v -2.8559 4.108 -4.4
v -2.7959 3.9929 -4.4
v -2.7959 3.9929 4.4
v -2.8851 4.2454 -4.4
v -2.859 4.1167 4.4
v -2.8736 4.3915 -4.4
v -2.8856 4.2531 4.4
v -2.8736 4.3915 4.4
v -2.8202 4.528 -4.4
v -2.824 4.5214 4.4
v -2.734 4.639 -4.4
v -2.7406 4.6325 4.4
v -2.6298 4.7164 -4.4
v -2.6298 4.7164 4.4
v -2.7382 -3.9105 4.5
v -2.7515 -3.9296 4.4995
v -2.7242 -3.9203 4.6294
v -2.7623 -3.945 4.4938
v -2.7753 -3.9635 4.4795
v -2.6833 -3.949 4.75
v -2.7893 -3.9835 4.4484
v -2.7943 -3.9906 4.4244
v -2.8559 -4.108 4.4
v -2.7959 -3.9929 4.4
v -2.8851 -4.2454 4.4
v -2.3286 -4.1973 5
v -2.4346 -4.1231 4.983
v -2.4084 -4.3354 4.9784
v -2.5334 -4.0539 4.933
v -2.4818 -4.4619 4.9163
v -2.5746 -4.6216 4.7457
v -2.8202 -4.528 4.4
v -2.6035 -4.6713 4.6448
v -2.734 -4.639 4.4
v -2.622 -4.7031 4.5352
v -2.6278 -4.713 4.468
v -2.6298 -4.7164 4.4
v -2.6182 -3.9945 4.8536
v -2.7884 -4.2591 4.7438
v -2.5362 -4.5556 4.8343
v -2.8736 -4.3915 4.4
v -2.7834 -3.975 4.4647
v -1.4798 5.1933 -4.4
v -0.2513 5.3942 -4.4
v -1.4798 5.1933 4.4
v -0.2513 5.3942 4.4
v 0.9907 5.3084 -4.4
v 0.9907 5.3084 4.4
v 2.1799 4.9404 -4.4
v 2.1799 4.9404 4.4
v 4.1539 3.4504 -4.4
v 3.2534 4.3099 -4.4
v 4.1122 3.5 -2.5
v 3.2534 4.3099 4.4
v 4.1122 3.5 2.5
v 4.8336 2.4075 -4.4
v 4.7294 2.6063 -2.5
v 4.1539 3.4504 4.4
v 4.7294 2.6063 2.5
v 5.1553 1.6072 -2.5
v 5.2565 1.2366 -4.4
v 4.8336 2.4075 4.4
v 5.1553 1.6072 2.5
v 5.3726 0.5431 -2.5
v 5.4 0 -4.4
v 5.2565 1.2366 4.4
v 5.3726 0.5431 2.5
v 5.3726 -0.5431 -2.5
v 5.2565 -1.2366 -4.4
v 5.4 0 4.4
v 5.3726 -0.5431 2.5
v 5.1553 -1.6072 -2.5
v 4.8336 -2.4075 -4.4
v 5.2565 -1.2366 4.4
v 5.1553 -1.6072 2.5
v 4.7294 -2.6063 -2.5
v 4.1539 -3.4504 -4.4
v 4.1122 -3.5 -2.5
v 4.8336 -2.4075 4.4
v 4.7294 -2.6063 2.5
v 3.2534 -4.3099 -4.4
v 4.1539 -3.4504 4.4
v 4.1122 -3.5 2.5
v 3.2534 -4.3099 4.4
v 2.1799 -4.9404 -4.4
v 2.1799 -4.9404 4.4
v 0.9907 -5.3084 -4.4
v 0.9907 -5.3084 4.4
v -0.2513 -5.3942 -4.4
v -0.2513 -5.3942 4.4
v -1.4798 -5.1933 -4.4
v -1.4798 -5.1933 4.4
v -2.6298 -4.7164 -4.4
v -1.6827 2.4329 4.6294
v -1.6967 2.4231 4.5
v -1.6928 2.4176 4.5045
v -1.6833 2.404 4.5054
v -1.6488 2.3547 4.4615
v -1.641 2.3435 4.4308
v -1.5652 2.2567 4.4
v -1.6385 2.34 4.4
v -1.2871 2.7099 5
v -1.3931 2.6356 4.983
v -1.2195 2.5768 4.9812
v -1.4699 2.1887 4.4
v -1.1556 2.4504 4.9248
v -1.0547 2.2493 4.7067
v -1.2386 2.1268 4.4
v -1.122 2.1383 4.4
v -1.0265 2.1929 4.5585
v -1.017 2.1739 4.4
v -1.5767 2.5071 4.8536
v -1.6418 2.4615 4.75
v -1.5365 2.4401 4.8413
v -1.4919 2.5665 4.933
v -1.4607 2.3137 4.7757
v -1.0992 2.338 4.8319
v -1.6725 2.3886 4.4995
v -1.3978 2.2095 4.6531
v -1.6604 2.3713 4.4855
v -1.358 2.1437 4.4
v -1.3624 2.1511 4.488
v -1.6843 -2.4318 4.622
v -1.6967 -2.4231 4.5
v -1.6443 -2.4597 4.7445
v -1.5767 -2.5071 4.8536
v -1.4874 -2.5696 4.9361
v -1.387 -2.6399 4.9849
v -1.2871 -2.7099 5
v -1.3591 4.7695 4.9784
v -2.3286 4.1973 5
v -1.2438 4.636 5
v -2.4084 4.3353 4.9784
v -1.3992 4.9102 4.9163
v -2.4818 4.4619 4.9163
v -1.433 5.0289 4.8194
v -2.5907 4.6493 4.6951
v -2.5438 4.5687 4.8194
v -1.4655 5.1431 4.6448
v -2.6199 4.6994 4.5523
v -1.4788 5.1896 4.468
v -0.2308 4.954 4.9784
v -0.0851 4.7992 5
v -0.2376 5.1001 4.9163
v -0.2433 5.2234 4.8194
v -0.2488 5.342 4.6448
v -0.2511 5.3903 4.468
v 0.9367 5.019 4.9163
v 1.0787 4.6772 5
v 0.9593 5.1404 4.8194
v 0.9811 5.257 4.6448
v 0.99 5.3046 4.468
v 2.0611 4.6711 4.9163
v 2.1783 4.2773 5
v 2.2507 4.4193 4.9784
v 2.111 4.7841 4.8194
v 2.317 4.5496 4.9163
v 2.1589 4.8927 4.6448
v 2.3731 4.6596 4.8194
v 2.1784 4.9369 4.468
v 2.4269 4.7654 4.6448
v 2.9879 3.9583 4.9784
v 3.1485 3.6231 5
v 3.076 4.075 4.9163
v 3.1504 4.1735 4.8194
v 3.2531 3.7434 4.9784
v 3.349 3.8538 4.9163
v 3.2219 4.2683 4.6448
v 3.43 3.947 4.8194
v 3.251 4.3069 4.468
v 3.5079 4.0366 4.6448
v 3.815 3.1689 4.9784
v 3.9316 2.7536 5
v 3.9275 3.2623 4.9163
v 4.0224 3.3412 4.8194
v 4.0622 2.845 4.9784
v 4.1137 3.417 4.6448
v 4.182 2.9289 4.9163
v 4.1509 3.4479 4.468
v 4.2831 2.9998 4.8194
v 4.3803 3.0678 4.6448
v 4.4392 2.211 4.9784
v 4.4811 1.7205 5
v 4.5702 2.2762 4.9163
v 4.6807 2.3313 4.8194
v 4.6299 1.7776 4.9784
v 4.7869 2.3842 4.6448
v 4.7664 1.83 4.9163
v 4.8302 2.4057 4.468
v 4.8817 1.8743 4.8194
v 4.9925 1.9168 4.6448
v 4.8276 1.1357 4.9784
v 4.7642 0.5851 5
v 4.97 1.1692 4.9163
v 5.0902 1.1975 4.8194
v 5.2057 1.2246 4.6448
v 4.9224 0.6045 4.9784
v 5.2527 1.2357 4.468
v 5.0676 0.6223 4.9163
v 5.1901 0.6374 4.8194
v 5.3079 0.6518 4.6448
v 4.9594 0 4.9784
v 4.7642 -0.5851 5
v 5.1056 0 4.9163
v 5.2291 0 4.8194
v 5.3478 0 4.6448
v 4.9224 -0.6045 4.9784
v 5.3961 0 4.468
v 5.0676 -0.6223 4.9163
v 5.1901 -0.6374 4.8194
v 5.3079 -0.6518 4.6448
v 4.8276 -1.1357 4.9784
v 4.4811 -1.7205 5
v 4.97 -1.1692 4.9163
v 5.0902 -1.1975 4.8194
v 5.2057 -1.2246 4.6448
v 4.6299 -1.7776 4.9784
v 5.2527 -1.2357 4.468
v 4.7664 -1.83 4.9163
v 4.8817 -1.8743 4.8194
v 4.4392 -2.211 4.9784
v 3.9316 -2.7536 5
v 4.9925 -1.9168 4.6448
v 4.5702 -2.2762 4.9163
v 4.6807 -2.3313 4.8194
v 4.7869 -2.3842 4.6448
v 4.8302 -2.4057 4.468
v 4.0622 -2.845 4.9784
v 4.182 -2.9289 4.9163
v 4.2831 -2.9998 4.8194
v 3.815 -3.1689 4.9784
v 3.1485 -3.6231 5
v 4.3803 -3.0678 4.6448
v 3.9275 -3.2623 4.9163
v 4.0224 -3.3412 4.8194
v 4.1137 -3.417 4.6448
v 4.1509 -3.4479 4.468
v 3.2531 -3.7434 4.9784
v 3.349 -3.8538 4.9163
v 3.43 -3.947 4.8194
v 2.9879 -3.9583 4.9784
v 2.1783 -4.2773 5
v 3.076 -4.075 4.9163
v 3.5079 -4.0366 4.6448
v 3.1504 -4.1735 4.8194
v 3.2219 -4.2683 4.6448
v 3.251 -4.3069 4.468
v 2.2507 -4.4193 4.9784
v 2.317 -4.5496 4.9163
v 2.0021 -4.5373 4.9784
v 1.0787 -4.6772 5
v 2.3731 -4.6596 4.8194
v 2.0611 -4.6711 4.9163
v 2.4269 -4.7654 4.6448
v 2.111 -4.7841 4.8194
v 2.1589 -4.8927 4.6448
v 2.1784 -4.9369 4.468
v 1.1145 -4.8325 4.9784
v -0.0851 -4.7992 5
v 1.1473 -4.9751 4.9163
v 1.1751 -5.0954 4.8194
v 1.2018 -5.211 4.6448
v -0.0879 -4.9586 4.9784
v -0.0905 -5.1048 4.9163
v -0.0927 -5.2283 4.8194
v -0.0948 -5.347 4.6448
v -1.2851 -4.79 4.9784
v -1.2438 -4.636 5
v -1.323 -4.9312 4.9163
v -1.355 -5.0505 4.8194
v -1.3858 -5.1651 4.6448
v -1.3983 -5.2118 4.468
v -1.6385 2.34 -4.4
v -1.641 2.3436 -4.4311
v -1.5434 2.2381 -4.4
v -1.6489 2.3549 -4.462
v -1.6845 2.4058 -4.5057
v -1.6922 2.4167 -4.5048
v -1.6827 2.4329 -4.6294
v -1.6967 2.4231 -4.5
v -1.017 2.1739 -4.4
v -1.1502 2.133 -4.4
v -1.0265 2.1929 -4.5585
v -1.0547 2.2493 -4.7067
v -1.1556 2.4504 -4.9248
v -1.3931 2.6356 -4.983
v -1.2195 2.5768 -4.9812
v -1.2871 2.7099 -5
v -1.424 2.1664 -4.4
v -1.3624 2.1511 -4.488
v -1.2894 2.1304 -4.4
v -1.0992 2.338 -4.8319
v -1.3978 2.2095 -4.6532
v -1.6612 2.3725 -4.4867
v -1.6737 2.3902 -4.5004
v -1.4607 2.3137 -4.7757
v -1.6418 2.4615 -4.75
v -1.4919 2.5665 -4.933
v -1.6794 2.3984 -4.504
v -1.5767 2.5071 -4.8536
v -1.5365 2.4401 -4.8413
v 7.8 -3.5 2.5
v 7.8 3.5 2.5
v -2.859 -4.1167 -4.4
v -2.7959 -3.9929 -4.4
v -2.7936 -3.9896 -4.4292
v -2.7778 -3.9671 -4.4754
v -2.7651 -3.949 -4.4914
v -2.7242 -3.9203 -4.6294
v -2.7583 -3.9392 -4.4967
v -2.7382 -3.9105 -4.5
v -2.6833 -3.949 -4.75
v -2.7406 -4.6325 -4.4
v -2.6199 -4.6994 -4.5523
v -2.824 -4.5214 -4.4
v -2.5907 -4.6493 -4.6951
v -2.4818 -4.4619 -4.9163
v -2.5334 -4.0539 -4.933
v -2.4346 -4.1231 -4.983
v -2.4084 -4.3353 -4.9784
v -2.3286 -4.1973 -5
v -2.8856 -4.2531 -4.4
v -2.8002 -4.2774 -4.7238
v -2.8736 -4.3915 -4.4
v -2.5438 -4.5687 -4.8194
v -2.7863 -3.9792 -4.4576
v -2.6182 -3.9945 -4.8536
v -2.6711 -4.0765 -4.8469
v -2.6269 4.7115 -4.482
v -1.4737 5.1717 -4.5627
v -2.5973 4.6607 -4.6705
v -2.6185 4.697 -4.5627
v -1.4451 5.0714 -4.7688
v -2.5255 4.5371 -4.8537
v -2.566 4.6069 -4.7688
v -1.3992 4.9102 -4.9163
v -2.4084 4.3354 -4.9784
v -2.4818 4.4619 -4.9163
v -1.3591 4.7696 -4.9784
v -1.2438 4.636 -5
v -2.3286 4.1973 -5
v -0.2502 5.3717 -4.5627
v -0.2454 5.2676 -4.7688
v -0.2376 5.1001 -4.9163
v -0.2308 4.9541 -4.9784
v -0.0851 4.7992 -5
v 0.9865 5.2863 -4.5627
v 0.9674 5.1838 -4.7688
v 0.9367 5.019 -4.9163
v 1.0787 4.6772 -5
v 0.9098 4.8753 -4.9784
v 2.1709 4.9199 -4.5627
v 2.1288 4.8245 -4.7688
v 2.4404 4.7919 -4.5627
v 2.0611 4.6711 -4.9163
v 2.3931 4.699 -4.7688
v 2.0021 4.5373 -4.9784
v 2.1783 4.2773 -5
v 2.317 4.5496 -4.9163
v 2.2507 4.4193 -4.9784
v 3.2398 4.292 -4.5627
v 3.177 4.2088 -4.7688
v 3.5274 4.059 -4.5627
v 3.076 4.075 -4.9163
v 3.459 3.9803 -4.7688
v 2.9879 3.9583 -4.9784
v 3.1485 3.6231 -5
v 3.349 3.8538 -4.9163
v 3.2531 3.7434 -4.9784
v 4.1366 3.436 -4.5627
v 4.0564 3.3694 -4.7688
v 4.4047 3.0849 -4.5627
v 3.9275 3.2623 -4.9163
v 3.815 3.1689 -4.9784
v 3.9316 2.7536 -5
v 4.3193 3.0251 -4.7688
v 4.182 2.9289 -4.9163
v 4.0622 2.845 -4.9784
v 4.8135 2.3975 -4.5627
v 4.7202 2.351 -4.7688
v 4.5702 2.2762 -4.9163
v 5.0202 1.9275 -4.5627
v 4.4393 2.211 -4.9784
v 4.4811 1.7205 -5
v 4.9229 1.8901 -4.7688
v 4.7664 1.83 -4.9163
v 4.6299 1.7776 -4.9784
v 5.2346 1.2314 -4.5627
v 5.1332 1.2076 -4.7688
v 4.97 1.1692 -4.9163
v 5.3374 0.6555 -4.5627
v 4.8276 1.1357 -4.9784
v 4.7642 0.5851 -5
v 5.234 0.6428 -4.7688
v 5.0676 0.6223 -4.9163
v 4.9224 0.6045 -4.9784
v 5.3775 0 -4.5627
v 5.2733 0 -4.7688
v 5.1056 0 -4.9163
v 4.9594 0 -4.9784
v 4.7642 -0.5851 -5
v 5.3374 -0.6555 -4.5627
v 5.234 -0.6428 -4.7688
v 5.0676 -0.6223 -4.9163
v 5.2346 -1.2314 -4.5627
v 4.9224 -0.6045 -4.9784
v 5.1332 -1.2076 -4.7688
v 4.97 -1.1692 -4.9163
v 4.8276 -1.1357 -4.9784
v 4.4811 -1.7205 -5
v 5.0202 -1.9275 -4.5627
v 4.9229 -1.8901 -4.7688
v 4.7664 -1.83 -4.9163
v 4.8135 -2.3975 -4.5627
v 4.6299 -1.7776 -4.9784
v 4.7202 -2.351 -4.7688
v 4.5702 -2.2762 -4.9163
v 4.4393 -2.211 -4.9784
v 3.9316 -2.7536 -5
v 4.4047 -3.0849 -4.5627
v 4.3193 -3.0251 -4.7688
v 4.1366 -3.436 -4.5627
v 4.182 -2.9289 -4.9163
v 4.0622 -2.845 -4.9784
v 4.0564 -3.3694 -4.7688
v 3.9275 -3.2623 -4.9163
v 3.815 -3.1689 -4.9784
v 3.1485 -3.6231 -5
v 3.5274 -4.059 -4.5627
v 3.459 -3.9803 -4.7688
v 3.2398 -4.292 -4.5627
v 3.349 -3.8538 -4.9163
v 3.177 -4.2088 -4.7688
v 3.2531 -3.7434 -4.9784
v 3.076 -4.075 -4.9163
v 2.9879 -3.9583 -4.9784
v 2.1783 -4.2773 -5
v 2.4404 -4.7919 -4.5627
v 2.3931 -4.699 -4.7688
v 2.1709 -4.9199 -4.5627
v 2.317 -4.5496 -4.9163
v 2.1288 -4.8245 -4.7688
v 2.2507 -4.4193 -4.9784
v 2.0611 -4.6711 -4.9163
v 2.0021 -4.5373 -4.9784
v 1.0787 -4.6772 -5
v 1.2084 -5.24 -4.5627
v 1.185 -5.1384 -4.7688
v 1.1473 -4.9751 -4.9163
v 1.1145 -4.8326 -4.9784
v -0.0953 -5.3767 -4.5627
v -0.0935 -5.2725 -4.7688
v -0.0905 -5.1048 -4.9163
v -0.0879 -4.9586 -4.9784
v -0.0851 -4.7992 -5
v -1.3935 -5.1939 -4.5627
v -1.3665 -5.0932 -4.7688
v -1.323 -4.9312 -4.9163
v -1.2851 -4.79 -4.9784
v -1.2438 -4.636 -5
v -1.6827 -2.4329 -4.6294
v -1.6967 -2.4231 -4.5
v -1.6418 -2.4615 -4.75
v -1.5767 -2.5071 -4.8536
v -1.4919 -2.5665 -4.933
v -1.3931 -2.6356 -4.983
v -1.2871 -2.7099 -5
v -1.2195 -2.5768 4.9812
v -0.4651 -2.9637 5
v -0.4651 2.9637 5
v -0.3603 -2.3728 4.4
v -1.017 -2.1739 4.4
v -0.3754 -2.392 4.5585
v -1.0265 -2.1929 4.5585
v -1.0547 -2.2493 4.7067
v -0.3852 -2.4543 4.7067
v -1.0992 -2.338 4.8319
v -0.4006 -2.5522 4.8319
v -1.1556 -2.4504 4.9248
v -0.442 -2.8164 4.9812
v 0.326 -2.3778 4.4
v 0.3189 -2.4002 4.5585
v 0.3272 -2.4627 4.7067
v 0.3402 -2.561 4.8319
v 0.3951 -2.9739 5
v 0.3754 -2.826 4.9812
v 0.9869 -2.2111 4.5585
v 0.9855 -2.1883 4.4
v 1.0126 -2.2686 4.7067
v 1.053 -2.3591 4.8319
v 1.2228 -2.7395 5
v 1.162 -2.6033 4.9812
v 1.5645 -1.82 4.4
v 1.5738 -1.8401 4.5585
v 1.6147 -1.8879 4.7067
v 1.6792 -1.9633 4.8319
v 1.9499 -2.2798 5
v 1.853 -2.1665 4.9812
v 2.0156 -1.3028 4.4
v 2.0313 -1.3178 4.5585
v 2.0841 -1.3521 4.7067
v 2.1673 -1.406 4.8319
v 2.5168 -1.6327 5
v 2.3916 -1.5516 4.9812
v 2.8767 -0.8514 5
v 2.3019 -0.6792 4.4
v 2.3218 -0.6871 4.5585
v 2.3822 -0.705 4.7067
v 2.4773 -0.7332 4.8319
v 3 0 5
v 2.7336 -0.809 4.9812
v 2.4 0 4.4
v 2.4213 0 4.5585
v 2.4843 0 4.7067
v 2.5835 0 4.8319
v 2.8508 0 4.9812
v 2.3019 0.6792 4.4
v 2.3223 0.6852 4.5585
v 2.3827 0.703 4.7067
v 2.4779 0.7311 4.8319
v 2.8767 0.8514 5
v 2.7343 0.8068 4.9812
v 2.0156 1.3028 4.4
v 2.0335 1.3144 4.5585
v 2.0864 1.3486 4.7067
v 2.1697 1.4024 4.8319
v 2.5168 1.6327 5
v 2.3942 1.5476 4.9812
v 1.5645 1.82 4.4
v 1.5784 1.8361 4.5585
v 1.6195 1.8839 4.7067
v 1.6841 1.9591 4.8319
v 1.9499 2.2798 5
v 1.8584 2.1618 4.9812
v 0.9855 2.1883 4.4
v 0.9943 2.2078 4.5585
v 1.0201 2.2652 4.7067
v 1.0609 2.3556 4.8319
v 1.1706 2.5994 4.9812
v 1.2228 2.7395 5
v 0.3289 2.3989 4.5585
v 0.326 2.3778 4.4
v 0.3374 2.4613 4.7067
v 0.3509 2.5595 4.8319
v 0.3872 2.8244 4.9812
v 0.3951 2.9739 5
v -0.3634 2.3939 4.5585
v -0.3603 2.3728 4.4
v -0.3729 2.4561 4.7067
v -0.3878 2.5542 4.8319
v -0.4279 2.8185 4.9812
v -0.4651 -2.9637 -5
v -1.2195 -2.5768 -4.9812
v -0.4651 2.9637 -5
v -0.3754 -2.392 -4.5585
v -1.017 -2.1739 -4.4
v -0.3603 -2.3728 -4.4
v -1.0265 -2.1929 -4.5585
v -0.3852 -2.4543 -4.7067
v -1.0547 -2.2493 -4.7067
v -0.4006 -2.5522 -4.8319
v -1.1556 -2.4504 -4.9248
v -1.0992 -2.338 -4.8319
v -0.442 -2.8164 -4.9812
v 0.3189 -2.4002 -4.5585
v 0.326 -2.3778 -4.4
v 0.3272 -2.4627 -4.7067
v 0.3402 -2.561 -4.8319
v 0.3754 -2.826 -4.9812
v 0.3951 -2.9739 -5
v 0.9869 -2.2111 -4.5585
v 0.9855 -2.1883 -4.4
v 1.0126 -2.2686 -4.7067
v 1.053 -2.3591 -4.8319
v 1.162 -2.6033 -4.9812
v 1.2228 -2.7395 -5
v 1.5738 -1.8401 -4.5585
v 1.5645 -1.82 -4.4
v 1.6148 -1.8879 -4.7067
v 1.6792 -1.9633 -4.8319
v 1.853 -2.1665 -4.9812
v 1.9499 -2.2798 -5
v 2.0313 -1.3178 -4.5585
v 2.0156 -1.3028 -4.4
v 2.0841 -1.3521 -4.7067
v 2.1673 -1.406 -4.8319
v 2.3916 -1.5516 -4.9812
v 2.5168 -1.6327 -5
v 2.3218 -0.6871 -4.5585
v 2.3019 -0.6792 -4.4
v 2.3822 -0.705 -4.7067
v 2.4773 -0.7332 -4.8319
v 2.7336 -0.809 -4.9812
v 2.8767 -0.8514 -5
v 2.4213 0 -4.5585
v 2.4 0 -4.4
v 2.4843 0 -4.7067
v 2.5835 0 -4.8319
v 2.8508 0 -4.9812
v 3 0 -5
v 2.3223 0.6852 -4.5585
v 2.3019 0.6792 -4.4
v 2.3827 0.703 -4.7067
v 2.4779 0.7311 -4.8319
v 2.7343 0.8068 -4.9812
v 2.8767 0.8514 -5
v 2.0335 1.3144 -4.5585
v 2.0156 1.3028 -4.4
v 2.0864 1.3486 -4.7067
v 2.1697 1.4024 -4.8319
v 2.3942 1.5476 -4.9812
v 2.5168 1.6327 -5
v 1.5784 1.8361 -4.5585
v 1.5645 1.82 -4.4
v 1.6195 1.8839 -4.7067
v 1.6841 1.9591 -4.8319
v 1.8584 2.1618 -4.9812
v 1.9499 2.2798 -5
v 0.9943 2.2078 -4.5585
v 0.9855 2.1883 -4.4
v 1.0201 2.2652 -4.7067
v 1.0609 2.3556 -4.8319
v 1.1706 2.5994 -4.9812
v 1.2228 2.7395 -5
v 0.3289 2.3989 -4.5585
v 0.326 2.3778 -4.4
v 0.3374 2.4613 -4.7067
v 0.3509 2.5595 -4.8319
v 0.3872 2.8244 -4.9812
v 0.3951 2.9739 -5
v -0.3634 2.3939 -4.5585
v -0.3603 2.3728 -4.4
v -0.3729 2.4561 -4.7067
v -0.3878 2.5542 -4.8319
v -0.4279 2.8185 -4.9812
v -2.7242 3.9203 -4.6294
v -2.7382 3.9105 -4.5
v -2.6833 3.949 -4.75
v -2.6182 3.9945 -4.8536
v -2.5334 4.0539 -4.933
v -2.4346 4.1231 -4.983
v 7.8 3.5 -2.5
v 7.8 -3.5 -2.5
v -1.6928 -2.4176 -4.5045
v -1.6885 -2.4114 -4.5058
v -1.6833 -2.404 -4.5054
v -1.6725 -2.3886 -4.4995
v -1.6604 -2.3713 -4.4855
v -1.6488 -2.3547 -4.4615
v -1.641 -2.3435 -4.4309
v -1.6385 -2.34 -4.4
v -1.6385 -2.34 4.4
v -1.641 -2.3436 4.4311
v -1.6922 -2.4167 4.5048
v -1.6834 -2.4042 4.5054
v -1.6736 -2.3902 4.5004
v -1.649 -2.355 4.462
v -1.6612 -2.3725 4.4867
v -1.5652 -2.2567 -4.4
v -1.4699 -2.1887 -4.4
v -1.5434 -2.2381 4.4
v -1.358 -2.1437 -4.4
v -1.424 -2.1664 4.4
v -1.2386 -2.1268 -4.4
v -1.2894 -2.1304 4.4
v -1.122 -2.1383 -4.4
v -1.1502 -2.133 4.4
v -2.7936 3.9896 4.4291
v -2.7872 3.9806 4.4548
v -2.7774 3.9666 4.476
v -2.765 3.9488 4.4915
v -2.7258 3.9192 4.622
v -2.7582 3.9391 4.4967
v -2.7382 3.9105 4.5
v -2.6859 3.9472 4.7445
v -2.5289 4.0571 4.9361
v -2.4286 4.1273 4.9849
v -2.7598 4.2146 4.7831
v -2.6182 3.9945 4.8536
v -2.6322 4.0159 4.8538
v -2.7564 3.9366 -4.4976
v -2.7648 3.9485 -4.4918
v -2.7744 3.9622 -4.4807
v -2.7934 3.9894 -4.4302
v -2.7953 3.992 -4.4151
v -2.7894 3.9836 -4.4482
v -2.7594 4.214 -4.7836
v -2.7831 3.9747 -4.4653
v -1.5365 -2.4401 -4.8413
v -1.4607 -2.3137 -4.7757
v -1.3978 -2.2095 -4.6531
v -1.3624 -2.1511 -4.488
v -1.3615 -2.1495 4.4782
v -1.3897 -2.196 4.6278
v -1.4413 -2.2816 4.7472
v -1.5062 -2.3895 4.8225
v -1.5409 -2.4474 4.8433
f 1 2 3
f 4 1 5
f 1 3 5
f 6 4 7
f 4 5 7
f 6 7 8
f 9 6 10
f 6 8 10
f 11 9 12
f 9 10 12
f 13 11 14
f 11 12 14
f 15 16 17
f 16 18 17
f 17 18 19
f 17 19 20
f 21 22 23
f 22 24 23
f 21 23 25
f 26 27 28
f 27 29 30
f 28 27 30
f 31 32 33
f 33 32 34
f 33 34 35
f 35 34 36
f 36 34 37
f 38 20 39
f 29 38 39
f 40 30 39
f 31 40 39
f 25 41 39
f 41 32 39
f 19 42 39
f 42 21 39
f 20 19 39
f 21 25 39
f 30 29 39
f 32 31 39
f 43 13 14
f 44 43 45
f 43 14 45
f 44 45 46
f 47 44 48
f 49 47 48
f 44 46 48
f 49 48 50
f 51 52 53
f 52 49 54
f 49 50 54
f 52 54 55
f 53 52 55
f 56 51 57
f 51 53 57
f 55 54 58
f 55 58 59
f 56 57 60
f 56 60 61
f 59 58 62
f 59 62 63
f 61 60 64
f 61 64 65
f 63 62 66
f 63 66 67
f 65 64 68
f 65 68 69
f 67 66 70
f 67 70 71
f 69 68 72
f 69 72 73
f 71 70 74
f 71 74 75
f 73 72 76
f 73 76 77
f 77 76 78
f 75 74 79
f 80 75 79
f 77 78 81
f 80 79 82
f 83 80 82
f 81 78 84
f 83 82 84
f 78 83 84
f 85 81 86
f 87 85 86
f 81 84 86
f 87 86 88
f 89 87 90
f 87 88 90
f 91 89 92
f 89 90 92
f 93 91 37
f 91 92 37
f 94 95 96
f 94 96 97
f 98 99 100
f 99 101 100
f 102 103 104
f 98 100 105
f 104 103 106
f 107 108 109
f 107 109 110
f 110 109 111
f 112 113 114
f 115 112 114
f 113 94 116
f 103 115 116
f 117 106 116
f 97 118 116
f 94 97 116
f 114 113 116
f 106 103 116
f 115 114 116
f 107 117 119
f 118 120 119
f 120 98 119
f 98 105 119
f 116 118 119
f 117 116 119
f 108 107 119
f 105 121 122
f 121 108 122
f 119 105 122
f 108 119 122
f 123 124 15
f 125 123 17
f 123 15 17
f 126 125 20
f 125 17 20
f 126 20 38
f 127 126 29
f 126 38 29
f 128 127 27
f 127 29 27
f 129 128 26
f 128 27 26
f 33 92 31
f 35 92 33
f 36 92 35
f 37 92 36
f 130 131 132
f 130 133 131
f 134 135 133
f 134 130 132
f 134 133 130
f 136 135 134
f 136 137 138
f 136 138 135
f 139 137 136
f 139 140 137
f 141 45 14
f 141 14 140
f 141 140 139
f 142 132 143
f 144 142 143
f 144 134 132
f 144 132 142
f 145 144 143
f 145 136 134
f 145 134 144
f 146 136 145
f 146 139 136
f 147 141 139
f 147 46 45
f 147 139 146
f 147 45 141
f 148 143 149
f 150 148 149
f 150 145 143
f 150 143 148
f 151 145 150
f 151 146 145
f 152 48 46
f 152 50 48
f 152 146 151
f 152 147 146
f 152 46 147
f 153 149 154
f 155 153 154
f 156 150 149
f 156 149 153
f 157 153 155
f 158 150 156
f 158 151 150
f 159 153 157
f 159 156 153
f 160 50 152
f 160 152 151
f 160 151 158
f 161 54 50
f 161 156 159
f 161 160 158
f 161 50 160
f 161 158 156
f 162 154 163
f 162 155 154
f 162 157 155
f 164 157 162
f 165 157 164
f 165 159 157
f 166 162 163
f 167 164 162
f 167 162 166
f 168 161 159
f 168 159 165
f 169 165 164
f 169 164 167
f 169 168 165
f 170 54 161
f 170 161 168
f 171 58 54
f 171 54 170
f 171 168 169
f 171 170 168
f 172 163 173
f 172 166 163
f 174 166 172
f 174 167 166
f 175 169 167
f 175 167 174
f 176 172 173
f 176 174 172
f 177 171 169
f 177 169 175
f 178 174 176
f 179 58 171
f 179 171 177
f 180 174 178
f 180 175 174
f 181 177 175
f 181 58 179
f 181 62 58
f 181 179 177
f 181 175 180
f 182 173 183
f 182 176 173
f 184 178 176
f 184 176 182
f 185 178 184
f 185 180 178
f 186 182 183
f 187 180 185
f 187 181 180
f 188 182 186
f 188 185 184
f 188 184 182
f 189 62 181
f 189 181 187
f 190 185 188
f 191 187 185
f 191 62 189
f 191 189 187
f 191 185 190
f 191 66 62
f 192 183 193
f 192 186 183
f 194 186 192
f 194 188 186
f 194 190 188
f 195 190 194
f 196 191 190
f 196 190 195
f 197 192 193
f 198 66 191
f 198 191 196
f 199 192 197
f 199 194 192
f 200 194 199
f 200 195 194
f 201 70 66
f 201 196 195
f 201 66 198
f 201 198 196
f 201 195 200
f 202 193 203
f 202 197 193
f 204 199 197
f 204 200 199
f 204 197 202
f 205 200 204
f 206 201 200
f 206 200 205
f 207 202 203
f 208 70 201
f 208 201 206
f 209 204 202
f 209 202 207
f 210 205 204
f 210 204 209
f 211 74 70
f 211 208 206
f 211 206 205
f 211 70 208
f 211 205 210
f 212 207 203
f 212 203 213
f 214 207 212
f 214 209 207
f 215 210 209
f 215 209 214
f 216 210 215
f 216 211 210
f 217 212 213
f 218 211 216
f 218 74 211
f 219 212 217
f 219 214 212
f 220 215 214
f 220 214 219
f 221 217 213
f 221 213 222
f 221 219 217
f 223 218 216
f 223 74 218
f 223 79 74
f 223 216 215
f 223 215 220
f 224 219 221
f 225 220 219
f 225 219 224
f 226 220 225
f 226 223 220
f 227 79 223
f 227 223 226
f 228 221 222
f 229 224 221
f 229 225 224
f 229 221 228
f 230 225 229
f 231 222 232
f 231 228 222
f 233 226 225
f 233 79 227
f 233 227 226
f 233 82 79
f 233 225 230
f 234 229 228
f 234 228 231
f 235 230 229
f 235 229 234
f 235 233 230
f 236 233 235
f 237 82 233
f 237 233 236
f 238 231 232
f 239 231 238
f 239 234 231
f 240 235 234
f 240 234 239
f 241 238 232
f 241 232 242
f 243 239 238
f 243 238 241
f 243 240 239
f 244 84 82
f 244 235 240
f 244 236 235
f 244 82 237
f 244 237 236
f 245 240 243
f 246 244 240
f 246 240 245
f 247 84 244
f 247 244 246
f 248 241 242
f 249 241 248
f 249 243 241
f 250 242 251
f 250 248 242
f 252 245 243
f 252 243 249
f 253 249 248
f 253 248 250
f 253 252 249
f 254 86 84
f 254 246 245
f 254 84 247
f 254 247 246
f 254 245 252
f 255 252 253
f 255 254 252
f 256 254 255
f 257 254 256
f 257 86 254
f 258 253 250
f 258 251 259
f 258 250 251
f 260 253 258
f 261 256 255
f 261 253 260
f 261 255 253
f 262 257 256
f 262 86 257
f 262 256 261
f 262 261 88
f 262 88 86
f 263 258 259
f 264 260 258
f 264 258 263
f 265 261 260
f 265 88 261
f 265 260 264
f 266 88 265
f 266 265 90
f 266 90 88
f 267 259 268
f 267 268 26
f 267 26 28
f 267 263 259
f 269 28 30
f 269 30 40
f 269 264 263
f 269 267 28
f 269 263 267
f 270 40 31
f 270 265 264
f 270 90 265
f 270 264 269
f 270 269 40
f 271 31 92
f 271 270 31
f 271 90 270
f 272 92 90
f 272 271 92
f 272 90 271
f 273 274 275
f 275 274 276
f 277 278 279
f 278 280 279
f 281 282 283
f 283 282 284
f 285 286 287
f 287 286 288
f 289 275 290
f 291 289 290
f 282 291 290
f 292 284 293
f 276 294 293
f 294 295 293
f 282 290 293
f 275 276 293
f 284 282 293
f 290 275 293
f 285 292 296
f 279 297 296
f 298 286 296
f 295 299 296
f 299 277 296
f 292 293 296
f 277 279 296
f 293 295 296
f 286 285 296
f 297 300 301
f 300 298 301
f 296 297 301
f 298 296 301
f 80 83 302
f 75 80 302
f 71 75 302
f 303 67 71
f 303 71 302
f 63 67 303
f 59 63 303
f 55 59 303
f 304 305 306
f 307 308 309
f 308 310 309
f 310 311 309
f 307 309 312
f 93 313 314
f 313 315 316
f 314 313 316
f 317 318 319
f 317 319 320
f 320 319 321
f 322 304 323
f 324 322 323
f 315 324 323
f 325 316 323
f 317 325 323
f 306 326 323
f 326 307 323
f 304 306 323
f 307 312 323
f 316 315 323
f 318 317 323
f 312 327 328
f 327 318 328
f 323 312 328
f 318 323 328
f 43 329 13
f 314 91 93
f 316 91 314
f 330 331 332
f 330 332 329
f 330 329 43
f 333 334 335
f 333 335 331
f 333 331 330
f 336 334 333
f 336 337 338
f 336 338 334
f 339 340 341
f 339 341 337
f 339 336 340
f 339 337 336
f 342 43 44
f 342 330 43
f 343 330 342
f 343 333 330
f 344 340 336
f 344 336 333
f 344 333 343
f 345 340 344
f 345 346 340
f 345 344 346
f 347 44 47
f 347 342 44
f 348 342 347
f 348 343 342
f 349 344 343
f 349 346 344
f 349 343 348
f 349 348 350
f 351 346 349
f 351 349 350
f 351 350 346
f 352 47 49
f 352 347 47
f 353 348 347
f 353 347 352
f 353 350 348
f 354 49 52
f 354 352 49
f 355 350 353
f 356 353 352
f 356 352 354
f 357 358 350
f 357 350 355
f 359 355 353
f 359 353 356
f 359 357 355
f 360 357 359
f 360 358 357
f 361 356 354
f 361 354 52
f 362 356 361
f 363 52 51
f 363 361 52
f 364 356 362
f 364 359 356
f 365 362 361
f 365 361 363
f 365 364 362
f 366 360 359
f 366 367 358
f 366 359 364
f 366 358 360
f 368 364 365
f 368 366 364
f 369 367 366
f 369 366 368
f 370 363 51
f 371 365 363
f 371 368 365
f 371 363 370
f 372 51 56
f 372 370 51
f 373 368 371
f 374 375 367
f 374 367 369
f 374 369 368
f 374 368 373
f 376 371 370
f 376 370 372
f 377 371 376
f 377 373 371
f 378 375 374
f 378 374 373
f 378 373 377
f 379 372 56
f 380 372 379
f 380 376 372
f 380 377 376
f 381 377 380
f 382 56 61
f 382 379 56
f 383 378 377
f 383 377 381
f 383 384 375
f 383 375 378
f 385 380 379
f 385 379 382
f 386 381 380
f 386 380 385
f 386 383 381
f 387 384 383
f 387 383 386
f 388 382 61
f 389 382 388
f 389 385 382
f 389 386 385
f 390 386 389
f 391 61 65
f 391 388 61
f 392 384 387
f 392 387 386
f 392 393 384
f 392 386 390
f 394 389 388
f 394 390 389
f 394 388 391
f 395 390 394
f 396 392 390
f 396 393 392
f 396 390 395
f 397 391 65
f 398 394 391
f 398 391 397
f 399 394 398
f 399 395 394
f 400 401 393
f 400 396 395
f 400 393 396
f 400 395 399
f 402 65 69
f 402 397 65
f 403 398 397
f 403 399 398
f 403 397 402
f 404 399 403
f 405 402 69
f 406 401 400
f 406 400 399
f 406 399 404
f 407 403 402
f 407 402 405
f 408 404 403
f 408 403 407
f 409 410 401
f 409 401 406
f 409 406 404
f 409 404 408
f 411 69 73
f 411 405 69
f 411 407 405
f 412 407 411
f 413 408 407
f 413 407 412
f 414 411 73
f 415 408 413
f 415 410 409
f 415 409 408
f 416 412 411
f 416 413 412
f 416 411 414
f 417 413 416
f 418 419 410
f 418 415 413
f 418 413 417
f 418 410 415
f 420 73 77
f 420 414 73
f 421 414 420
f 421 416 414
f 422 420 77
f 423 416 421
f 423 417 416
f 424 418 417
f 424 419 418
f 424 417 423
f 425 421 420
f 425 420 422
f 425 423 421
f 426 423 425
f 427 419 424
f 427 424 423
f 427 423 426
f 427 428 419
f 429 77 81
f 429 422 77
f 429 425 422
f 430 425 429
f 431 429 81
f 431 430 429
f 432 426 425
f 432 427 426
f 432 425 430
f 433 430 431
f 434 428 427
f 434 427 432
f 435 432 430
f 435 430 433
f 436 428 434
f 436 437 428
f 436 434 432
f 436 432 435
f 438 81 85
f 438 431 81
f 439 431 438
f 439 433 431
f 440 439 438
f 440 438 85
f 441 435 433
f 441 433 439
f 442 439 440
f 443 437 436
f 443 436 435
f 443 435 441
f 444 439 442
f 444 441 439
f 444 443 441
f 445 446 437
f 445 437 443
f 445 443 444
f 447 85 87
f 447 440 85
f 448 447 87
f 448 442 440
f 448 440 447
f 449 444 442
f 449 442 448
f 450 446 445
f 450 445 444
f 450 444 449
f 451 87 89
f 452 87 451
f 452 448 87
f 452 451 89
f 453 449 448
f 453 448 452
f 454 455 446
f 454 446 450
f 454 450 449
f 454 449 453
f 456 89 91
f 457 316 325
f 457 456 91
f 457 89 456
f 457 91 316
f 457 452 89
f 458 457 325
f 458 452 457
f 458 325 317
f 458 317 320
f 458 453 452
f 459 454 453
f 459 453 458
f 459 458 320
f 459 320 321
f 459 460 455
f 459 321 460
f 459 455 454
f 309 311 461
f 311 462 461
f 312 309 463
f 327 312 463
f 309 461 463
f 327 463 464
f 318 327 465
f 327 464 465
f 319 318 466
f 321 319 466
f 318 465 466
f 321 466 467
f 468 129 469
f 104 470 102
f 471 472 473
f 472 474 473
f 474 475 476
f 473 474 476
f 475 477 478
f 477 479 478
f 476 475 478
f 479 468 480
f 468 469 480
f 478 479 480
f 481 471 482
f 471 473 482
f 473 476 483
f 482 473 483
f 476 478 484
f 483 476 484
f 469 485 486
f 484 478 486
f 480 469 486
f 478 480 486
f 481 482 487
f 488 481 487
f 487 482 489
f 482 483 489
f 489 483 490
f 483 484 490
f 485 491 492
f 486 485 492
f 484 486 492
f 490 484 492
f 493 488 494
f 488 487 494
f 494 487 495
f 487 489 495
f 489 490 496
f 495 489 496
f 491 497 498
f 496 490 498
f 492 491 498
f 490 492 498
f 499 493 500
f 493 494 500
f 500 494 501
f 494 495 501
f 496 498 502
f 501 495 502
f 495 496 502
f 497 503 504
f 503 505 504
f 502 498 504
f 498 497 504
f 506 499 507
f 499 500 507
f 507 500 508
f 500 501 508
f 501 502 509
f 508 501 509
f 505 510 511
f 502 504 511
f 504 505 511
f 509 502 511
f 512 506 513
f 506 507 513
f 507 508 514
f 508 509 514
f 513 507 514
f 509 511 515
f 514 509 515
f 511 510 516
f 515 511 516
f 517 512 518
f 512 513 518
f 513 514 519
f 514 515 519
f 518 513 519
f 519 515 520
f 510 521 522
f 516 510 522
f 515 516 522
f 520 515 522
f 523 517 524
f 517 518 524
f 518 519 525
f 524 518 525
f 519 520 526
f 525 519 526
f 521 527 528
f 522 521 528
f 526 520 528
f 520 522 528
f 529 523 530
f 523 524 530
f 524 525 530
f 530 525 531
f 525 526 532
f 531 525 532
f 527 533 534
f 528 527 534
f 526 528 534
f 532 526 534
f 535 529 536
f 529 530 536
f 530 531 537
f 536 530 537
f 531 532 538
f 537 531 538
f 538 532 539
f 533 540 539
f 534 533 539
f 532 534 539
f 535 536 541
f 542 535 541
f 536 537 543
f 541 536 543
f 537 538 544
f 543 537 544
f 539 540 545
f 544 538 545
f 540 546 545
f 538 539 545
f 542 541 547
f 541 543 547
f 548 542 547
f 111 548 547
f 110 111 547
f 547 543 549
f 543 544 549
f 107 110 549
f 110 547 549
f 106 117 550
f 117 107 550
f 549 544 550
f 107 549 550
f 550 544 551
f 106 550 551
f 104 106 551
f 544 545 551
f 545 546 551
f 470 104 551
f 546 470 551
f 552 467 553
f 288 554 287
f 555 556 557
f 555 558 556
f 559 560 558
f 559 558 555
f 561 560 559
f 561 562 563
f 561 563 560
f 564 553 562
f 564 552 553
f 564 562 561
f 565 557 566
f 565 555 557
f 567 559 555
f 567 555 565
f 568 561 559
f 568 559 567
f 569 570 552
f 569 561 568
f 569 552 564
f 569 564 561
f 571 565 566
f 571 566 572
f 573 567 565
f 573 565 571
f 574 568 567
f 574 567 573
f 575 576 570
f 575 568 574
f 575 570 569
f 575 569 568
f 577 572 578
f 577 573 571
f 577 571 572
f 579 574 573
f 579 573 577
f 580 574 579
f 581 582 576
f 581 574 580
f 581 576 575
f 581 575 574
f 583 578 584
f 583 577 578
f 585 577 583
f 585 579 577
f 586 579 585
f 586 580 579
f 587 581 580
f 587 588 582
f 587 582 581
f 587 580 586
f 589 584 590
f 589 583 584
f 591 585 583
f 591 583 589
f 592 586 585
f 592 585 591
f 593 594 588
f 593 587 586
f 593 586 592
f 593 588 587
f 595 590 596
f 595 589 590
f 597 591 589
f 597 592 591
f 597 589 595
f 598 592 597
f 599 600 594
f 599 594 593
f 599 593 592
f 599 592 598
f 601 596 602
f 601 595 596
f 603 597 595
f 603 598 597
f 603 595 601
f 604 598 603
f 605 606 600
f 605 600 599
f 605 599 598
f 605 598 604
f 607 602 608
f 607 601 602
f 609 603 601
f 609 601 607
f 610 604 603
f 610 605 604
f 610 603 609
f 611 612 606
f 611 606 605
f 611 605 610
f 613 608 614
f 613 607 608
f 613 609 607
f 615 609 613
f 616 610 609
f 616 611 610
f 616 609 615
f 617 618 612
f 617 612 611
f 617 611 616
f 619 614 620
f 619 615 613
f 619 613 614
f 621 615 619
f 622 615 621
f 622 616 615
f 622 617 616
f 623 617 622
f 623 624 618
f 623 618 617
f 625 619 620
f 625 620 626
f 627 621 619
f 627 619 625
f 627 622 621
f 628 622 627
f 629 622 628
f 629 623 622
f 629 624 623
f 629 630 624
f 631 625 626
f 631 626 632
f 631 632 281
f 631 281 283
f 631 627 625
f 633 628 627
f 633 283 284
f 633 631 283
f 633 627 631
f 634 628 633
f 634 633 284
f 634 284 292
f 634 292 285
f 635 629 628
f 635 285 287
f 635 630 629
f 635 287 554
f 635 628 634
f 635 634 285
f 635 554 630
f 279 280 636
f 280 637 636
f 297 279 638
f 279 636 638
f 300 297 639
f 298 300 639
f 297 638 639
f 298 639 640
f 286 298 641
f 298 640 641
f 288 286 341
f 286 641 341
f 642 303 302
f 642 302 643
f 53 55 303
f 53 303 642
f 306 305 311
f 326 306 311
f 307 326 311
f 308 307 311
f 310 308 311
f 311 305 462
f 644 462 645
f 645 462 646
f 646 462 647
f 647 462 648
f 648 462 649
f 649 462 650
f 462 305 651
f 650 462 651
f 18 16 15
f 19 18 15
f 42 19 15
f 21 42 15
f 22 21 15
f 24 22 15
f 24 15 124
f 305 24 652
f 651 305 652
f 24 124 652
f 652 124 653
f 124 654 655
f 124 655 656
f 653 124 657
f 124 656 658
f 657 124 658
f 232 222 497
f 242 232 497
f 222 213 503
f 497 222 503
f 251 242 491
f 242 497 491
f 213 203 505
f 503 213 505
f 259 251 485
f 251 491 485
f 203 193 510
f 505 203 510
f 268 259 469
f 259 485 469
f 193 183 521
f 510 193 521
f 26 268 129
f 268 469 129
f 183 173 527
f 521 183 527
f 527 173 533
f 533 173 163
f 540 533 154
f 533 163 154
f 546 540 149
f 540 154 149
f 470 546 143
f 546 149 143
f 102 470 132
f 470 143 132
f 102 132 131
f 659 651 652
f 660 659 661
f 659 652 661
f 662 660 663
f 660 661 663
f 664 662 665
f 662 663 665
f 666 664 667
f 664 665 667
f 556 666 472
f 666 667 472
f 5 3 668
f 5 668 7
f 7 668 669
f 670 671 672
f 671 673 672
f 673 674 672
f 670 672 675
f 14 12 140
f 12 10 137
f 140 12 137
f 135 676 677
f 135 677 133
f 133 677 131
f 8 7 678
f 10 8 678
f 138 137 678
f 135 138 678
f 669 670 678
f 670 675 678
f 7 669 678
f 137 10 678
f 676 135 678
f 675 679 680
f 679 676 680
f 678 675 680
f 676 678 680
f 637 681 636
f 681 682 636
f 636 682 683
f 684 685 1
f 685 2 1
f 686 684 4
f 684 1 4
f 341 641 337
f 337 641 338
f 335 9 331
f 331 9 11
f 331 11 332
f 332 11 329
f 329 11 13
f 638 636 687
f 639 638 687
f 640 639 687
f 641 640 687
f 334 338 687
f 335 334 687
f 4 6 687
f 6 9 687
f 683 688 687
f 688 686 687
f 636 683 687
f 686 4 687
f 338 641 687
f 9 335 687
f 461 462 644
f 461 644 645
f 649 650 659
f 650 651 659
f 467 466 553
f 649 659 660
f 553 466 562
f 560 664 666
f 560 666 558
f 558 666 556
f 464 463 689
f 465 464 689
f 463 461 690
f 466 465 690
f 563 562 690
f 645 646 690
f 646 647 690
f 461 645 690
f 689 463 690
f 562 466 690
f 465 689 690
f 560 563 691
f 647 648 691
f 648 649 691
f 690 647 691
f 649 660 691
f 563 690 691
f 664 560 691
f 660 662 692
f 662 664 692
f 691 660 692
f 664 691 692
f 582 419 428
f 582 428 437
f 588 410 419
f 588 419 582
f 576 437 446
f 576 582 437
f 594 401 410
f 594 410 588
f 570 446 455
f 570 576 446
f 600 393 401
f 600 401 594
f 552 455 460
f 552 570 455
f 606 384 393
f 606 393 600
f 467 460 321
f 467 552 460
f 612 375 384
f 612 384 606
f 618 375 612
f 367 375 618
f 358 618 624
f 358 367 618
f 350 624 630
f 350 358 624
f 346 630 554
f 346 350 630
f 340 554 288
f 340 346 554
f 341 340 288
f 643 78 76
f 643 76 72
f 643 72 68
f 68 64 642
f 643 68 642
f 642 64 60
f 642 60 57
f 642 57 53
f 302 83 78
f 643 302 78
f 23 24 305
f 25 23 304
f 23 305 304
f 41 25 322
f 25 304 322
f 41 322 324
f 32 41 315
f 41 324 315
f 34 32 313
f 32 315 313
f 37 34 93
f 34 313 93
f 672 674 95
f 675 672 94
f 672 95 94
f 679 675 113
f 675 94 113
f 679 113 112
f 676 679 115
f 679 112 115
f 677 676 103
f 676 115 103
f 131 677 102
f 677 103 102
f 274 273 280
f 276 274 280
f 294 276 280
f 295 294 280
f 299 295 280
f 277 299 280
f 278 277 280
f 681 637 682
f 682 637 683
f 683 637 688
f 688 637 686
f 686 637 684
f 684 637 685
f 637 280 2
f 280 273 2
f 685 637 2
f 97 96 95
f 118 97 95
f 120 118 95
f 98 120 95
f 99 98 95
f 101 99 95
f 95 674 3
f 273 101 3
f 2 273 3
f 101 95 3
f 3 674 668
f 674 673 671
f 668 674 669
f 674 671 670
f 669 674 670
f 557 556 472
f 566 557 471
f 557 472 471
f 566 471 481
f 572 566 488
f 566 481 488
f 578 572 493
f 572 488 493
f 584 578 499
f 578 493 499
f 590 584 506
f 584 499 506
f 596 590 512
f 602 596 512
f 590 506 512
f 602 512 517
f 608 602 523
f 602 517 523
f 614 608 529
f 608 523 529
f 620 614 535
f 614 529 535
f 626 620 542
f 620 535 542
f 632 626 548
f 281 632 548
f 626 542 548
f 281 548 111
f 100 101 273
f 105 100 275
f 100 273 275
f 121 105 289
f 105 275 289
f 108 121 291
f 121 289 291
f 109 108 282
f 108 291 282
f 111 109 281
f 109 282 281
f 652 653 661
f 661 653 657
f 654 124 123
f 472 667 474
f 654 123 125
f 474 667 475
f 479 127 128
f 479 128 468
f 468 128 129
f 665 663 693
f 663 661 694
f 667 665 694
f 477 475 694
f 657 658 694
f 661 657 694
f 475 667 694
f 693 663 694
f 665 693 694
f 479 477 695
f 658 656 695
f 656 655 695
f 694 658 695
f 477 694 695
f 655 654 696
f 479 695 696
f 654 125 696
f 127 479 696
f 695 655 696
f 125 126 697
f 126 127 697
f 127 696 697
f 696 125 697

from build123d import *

# Parameters (mm, degrees)
EXTRUDE_THIN1_DEPTH = 5
FILLET1_R           = 0.6
FILLET2_R           = 0.5
BOSS_EXTRUDE1_START = 3.8
SKETCH2_W           = 5
SKETCH2_H           = 7
BOSS_EXTRUDE1_DEPTH = 4


with BuildPart() as part:
    # Sketch1 → Extrude-Thin1 (new, symmetric)
    with BuildSketch(Plane.XY):
        with BuildLine():
            ThreePointArc((-1.376583447, -1.965964906), (2.4, 0), (-1.376583447, 1.965964906))
            Line((-1.376583447, 1.965964906), (-3.097312756, 4.423421039))
            ThreePointArc((-3.097312756, 4.423421039), (5.4, 0), (-3.097312756, -4.423421039))
            Line((-3.097312756, -4.423421039), (-1.376583447, -1.965964906))
        make_face()
    extrude(amount=EXTRUDE_THIN1_DEPTH, both=True)

    # Fillet1
    fillet1_edges = [part.edges().sort_by_distance(p)[0] for p in [
        (2.4, 0, 5),
        (2.4, 0, -5),
        (5.4, 0, 5),
        (5.4, 0, -5),
    ]]
    fillet(fillet1_edges, radius=FILLET1_R)

    # Fillet2
    fillet2_edges = [part.edges().sort_by_distance(p)[0] for p in [
        (-2.236948102, -3.194692973, -5),
        (-2.236948102, 3.194692973, -5),
        (-1.376583447, 1.965964906, 0),
        (-2.236948102, 3.194692973, 5),
        (-3.097312756, 4.423421039, 0),
        (-2.996514767, 4.279466592, 4.824264069),
        (-2.996514767, 4.279466592, -4.824264069),
        (-1.477381436, 2.109919354, 4.824264069),
        (-1.477381436, 2.109919354, -4.824264069),
        (-1.376583447, -1.965964906, 0),
        (-3.097312756, -4.423421039, 0),
        (-2.236948102, -3.194692973, 5),
        (-2.996514767, -4.279466592, 4.824264069),
        (-2.996514767, -4.279466592, -4.824264069),
        (-1.477381436, -2.109919354, 4.824264069),
        (-1.477381436, -2.109919354, -4.824264069),
    ]]
    fillet(fillet2_edges, radius=FILLET2_R)

    # Sketch2 → Boss-Extrude1 (add)
    with BuildSketch(Plane(origin=(0, 0, 0), x_dir=(0, 0, -1), z_dir=(1, 0, 0)).offset(BOSS_EXTRUDE1_START)):
        Rectangle(SKETCH2_W, SKETCH2_H)
    extrude(amount=BOSS_EXTRUDE1_DEPTH)


solid = part.part
